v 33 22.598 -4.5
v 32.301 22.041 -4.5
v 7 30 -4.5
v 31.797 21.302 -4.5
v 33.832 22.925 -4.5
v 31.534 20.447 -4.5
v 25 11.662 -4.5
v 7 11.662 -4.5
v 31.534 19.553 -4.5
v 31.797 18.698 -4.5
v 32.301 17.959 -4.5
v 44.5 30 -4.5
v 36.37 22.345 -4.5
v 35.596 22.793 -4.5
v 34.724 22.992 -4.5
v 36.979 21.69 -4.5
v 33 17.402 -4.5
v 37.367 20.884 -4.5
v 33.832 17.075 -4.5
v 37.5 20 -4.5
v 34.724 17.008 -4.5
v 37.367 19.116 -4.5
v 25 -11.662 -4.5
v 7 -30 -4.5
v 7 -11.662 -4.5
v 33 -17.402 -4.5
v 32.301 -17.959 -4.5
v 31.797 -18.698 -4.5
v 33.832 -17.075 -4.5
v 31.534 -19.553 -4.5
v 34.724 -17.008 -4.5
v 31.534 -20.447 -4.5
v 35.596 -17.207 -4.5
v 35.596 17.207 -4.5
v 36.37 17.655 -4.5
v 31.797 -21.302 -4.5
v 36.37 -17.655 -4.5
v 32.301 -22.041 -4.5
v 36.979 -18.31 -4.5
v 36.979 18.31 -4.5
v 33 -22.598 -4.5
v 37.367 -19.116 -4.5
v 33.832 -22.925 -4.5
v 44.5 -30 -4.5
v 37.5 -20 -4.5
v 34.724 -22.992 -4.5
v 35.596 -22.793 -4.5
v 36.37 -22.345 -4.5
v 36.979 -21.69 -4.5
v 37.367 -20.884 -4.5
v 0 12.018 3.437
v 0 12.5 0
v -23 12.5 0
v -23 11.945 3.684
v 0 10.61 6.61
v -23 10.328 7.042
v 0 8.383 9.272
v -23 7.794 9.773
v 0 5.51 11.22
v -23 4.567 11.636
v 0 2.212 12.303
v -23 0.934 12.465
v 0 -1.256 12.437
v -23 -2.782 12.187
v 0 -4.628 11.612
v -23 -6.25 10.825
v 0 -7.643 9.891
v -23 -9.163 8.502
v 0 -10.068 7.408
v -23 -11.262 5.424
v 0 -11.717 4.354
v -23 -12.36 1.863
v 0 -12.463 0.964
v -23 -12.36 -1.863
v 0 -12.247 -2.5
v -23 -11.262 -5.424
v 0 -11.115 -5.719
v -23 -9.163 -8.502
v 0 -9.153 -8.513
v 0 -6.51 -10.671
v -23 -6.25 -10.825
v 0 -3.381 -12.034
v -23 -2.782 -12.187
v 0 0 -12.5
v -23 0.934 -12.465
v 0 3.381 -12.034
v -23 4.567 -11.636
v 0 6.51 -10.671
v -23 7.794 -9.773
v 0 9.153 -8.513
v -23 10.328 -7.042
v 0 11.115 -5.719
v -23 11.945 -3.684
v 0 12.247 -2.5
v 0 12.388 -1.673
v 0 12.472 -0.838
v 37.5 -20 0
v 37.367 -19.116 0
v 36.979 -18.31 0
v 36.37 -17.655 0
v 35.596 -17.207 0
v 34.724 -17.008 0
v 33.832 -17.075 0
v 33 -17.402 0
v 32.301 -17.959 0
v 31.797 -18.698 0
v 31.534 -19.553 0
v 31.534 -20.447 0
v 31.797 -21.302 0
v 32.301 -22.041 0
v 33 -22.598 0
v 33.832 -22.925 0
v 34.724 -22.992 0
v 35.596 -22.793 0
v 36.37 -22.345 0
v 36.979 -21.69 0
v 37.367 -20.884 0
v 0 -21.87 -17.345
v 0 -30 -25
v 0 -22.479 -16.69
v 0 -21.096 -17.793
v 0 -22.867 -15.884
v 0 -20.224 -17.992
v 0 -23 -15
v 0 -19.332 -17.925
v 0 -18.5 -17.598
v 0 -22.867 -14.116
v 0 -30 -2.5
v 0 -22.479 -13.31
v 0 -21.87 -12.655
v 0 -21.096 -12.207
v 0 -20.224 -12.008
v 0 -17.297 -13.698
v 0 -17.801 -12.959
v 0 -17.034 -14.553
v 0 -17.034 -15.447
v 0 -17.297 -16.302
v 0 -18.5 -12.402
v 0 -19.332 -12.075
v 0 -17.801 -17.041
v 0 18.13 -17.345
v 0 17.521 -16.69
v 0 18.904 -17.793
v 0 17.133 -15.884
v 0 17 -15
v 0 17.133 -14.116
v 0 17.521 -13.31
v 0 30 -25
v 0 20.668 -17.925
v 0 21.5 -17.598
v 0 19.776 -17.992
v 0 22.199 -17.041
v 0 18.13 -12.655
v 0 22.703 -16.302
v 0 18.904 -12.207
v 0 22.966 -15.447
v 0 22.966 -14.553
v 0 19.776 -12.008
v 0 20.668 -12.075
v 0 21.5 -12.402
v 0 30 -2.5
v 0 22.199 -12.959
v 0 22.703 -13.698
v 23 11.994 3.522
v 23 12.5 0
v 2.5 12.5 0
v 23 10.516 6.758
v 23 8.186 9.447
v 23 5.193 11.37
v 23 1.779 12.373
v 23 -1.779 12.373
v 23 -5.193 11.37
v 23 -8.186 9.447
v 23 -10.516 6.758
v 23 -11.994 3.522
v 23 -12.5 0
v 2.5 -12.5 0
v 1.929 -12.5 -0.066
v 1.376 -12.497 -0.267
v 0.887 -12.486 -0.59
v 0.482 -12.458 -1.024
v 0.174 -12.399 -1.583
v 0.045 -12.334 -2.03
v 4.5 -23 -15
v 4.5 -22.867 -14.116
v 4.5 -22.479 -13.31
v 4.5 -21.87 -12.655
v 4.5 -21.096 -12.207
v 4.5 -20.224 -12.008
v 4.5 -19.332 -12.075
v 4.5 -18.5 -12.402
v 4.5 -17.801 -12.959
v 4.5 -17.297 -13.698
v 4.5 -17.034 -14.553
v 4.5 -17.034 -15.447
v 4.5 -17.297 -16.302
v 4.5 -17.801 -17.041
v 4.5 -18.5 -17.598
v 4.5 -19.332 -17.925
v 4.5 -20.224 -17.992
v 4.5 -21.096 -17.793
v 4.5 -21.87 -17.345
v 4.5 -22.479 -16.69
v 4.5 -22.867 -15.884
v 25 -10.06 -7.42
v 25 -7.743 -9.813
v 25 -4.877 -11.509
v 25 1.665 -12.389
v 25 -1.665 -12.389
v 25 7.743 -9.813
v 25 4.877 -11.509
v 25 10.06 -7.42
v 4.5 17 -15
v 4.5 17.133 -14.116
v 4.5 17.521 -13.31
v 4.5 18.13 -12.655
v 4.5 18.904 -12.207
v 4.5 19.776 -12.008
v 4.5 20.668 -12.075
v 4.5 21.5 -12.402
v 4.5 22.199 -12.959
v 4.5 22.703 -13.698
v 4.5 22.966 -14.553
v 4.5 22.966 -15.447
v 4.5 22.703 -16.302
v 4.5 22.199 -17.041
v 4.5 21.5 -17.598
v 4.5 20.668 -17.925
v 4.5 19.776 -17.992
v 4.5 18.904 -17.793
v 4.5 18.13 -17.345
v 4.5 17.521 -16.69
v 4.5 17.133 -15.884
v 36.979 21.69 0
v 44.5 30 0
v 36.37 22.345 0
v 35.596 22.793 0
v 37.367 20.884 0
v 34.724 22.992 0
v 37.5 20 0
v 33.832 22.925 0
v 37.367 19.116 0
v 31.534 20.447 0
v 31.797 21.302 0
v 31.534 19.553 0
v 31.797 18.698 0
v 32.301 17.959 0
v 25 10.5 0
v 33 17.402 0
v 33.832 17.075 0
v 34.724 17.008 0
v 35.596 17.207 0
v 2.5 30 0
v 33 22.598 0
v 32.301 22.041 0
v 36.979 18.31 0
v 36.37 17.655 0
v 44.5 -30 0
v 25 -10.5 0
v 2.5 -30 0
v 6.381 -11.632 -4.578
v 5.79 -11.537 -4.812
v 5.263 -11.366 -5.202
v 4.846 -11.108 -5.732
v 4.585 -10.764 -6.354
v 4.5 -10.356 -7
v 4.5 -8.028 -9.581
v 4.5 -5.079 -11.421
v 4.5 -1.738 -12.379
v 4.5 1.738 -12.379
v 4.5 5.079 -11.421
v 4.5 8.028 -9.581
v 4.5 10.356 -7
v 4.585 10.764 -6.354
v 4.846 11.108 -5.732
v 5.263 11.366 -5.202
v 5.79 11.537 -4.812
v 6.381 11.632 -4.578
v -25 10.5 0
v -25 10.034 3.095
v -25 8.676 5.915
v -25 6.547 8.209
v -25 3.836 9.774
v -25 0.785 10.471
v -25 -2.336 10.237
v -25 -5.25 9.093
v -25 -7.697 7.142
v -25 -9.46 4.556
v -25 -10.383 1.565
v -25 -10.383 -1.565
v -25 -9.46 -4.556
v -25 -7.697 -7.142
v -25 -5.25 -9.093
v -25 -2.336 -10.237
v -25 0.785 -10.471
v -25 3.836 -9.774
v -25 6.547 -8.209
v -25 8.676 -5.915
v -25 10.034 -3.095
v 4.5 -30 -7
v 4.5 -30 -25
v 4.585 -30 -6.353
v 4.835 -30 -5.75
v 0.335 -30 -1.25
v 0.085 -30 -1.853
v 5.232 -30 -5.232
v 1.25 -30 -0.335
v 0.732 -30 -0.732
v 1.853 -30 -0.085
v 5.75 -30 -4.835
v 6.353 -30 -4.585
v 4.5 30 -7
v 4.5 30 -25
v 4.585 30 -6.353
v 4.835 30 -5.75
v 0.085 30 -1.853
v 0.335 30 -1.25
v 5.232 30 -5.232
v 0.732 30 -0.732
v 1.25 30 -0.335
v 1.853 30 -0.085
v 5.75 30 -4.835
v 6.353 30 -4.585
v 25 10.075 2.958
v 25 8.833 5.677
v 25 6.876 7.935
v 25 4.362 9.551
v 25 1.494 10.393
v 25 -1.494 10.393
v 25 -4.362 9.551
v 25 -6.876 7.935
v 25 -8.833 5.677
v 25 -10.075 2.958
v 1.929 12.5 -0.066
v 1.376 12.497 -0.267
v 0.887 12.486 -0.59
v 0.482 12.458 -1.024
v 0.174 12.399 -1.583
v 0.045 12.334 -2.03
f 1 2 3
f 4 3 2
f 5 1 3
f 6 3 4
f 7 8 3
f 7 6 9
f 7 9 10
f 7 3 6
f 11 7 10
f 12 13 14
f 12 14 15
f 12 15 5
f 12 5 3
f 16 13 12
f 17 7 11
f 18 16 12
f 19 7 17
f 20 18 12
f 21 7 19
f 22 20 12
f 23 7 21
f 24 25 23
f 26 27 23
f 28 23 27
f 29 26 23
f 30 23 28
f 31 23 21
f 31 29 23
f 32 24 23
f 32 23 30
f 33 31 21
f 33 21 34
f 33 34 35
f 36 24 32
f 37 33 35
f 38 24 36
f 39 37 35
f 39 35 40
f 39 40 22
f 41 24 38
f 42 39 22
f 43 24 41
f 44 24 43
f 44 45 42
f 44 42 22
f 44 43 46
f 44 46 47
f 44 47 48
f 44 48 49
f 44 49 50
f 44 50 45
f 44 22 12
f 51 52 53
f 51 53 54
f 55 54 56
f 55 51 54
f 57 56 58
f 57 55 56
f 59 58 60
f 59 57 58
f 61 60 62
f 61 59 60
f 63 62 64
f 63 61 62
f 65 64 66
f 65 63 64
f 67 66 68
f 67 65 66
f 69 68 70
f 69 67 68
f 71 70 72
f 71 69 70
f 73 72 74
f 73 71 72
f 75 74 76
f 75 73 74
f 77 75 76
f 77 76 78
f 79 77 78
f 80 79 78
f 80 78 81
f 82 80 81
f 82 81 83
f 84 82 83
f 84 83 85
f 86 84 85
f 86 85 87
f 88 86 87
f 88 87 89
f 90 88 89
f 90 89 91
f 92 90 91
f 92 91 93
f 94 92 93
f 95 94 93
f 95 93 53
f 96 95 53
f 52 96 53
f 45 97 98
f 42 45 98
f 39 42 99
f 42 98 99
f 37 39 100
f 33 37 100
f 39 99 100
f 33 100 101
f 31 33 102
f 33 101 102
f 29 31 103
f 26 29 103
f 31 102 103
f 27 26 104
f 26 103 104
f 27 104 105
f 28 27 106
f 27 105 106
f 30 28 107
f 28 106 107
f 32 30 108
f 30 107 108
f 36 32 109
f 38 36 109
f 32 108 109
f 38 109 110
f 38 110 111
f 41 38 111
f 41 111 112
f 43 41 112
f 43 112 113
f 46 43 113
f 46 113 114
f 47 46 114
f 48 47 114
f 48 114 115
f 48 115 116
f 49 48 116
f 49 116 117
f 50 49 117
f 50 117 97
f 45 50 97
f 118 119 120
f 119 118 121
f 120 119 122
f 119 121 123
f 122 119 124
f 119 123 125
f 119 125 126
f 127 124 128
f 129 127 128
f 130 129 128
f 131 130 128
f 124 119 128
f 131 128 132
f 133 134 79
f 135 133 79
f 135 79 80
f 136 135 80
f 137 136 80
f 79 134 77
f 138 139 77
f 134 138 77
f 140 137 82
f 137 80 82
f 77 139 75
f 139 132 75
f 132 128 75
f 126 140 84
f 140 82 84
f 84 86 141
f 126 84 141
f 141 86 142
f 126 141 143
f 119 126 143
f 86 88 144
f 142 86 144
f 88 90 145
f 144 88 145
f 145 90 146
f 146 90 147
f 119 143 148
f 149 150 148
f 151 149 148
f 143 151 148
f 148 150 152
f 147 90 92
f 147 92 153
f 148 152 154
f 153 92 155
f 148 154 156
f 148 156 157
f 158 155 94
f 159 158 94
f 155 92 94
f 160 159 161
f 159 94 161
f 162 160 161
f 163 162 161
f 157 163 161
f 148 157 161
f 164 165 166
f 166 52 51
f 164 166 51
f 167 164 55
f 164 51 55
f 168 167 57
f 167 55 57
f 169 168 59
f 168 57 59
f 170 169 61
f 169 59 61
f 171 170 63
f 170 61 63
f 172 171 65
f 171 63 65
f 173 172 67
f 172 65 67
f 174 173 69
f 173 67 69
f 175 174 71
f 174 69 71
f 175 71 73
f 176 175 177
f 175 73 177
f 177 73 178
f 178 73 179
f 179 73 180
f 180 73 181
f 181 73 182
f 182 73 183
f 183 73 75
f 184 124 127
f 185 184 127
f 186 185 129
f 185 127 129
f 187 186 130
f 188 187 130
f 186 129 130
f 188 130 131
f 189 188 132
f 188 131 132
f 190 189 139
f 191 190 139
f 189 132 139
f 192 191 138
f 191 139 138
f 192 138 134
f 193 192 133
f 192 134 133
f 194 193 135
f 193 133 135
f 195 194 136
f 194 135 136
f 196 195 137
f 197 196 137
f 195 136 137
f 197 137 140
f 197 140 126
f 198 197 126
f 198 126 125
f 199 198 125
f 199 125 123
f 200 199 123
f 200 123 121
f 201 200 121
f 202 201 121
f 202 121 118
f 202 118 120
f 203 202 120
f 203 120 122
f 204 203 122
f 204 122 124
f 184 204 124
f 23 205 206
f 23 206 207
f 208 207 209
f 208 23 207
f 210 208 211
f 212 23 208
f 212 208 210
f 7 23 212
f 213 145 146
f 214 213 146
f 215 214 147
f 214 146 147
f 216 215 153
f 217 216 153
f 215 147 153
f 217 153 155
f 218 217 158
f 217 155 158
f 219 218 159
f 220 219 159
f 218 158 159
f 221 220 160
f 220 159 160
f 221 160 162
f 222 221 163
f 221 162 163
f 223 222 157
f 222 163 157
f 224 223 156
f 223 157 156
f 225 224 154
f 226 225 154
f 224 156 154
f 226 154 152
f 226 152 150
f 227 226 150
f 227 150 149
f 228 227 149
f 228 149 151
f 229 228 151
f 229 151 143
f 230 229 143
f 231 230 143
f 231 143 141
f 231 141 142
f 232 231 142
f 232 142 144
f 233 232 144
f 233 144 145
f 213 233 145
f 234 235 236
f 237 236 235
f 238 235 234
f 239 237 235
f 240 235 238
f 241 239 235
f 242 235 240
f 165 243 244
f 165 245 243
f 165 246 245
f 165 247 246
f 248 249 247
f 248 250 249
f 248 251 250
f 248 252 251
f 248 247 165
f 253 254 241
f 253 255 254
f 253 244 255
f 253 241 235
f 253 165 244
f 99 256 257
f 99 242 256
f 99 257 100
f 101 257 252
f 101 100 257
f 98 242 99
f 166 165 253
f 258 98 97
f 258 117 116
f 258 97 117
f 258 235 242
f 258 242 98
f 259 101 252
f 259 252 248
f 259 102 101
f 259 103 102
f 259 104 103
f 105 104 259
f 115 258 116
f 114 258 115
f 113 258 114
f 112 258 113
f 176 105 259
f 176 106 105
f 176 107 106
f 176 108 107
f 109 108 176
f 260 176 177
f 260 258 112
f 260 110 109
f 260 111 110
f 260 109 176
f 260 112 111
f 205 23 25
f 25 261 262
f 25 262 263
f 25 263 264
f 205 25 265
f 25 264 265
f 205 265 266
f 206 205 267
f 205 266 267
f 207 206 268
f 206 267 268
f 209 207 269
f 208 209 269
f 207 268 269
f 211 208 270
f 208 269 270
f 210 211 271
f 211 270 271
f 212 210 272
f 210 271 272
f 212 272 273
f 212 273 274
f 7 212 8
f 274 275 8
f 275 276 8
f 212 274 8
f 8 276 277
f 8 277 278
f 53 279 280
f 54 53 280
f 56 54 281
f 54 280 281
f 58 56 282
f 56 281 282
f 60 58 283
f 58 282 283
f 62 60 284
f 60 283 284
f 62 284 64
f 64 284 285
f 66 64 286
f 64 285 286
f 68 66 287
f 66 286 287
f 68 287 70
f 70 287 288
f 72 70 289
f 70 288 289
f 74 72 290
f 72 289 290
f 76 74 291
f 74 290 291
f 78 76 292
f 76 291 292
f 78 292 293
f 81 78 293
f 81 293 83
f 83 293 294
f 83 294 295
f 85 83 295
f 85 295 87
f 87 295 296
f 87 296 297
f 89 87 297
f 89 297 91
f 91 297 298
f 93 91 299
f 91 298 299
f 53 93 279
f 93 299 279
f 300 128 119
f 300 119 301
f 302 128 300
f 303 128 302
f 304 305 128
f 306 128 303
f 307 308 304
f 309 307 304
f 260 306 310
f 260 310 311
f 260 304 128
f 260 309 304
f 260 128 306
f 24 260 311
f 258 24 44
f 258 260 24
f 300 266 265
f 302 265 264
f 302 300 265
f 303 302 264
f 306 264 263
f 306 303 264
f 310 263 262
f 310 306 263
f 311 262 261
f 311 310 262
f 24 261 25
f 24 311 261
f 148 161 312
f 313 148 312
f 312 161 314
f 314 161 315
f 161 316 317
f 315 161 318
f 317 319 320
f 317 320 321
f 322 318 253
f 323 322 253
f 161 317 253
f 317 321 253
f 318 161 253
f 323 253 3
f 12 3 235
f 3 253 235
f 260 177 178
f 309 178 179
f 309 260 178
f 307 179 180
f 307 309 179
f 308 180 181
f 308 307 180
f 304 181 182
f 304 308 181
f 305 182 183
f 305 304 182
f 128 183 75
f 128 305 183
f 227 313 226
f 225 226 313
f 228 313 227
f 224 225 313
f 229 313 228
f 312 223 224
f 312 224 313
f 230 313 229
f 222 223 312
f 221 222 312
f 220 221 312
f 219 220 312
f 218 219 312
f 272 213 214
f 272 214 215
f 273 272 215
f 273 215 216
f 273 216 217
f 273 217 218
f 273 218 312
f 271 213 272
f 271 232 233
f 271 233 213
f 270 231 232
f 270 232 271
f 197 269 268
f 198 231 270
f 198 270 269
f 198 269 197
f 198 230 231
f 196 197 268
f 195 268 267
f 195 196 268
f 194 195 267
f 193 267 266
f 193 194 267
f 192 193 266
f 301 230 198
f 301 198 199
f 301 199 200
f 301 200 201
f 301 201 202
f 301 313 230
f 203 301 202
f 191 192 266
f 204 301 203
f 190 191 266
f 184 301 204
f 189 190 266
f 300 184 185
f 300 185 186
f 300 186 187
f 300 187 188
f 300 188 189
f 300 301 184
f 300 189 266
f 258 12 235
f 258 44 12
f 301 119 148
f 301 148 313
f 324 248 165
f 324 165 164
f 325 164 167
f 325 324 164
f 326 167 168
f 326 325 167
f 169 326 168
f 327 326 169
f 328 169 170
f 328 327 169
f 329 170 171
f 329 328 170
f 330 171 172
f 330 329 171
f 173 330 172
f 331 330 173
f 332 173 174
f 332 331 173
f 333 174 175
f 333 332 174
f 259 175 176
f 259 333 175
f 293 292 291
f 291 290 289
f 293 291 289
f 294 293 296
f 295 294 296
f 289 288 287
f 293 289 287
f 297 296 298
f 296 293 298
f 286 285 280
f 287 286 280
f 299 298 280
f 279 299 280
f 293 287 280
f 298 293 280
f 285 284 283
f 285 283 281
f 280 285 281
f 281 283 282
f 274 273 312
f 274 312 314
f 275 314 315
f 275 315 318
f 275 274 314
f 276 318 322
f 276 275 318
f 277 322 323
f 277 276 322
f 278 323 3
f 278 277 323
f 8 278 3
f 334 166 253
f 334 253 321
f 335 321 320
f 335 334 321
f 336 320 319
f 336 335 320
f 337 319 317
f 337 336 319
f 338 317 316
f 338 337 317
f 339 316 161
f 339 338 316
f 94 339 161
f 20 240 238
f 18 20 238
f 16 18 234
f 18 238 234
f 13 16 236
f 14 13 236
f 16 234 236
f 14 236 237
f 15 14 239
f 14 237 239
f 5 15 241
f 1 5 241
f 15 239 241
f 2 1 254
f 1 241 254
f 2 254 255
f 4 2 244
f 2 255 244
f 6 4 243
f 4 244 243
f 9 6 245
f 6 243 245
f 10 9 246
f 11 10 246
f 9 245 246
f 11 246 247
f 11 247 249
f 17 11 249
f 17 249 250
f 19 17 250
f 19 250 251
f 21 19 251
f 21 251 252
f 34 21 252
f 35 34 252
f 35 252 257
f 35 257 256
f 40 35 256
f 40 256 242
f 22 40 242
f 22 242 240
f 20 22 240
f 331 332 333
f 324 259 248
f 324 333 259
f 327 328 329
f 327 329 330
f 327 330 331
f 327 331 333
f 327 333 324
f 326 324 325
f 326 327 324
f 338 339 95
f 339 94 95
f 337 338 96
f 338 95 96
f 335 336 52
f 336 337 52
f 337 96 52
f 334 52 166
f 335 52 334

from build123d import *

# Parameters (mm, degrees)
F1_DEPTH      = 30
F2_R          = 12.5
F3_DEPTH      = 25
F3_DEPTH_BACK = 25
F4_SIZE       = 2
F5_R          = 3
F6_DEPTH      = 44.501
F7_R          = 3
F8_DEPTH      = 25.001


with BuildPart() as f1:
    # F0 (on Front) → F1 (new body, symmetric)
    with BuildSketch(Plane.XZ):
        with BuildLine():
            Line((44.5, 0), (2.5, 0))
            ThreePointArc((2.5, 0), (0.732233047, -0.732233047), (0, -2.5))
            Line((0, -2.5), (0, -25))
            Line((0, -25), (4.5, -25))
            Line((4.5, -25), (4.5, -7))
            ThreePointArc((4.5, -7), (5.232233047, -5.232233047), (7, -4.5))
            Line((7, -4.5), (44.5, -4.5))
            Line((44.5, -4.5), (44.5, 0))
        make_face()
    extrude(amount=F1_DEPTH, both=True)

    # F2 (on Right) → F3 (join, two sides)
    with BuildSketch(Plane.YZ) as f3_sk:
        Circle(F2_R)
    extrude(amount=F3_DEPTH)
    extrude(f3_sk.sketch, amount=-F3_DEPTH_BACK)

    # F4
    f4_edges = [f1.edges().sort_by_distance(p)[0] for p in [
        (-25, -12.5, 0),
        (25, 0, 12.5),
    ]]
    chamfer(f4_edges, length=F4_SIZE)

    # F5 (on face) → F6 (cut, through all)
    with BuildSketch(Plane(origin=(0, 0, 0), x_dir=(0, -1, 0), z_dir=(-1, 0, 0))):
        with Locations((-20, -15)):
            Circle(F5_R)
        with Locations((20, -15)):
            Circle(F5_R)
    extrude(amount=-F6_DEPTH, mode=Mode.SUBTRACT)

    # F7 (on face) → F8 (cut, through all)
    with BuildSketch(Plane.XY):
        with Locations((34.5, 20)):
            Circle(F7_R)
        with Locations((34.5, -20)):
            Circle(F7_R)
    extrude(amount=-F8_DEPTH, mode=Mode.SUBTRACT)


solid = f1.part
